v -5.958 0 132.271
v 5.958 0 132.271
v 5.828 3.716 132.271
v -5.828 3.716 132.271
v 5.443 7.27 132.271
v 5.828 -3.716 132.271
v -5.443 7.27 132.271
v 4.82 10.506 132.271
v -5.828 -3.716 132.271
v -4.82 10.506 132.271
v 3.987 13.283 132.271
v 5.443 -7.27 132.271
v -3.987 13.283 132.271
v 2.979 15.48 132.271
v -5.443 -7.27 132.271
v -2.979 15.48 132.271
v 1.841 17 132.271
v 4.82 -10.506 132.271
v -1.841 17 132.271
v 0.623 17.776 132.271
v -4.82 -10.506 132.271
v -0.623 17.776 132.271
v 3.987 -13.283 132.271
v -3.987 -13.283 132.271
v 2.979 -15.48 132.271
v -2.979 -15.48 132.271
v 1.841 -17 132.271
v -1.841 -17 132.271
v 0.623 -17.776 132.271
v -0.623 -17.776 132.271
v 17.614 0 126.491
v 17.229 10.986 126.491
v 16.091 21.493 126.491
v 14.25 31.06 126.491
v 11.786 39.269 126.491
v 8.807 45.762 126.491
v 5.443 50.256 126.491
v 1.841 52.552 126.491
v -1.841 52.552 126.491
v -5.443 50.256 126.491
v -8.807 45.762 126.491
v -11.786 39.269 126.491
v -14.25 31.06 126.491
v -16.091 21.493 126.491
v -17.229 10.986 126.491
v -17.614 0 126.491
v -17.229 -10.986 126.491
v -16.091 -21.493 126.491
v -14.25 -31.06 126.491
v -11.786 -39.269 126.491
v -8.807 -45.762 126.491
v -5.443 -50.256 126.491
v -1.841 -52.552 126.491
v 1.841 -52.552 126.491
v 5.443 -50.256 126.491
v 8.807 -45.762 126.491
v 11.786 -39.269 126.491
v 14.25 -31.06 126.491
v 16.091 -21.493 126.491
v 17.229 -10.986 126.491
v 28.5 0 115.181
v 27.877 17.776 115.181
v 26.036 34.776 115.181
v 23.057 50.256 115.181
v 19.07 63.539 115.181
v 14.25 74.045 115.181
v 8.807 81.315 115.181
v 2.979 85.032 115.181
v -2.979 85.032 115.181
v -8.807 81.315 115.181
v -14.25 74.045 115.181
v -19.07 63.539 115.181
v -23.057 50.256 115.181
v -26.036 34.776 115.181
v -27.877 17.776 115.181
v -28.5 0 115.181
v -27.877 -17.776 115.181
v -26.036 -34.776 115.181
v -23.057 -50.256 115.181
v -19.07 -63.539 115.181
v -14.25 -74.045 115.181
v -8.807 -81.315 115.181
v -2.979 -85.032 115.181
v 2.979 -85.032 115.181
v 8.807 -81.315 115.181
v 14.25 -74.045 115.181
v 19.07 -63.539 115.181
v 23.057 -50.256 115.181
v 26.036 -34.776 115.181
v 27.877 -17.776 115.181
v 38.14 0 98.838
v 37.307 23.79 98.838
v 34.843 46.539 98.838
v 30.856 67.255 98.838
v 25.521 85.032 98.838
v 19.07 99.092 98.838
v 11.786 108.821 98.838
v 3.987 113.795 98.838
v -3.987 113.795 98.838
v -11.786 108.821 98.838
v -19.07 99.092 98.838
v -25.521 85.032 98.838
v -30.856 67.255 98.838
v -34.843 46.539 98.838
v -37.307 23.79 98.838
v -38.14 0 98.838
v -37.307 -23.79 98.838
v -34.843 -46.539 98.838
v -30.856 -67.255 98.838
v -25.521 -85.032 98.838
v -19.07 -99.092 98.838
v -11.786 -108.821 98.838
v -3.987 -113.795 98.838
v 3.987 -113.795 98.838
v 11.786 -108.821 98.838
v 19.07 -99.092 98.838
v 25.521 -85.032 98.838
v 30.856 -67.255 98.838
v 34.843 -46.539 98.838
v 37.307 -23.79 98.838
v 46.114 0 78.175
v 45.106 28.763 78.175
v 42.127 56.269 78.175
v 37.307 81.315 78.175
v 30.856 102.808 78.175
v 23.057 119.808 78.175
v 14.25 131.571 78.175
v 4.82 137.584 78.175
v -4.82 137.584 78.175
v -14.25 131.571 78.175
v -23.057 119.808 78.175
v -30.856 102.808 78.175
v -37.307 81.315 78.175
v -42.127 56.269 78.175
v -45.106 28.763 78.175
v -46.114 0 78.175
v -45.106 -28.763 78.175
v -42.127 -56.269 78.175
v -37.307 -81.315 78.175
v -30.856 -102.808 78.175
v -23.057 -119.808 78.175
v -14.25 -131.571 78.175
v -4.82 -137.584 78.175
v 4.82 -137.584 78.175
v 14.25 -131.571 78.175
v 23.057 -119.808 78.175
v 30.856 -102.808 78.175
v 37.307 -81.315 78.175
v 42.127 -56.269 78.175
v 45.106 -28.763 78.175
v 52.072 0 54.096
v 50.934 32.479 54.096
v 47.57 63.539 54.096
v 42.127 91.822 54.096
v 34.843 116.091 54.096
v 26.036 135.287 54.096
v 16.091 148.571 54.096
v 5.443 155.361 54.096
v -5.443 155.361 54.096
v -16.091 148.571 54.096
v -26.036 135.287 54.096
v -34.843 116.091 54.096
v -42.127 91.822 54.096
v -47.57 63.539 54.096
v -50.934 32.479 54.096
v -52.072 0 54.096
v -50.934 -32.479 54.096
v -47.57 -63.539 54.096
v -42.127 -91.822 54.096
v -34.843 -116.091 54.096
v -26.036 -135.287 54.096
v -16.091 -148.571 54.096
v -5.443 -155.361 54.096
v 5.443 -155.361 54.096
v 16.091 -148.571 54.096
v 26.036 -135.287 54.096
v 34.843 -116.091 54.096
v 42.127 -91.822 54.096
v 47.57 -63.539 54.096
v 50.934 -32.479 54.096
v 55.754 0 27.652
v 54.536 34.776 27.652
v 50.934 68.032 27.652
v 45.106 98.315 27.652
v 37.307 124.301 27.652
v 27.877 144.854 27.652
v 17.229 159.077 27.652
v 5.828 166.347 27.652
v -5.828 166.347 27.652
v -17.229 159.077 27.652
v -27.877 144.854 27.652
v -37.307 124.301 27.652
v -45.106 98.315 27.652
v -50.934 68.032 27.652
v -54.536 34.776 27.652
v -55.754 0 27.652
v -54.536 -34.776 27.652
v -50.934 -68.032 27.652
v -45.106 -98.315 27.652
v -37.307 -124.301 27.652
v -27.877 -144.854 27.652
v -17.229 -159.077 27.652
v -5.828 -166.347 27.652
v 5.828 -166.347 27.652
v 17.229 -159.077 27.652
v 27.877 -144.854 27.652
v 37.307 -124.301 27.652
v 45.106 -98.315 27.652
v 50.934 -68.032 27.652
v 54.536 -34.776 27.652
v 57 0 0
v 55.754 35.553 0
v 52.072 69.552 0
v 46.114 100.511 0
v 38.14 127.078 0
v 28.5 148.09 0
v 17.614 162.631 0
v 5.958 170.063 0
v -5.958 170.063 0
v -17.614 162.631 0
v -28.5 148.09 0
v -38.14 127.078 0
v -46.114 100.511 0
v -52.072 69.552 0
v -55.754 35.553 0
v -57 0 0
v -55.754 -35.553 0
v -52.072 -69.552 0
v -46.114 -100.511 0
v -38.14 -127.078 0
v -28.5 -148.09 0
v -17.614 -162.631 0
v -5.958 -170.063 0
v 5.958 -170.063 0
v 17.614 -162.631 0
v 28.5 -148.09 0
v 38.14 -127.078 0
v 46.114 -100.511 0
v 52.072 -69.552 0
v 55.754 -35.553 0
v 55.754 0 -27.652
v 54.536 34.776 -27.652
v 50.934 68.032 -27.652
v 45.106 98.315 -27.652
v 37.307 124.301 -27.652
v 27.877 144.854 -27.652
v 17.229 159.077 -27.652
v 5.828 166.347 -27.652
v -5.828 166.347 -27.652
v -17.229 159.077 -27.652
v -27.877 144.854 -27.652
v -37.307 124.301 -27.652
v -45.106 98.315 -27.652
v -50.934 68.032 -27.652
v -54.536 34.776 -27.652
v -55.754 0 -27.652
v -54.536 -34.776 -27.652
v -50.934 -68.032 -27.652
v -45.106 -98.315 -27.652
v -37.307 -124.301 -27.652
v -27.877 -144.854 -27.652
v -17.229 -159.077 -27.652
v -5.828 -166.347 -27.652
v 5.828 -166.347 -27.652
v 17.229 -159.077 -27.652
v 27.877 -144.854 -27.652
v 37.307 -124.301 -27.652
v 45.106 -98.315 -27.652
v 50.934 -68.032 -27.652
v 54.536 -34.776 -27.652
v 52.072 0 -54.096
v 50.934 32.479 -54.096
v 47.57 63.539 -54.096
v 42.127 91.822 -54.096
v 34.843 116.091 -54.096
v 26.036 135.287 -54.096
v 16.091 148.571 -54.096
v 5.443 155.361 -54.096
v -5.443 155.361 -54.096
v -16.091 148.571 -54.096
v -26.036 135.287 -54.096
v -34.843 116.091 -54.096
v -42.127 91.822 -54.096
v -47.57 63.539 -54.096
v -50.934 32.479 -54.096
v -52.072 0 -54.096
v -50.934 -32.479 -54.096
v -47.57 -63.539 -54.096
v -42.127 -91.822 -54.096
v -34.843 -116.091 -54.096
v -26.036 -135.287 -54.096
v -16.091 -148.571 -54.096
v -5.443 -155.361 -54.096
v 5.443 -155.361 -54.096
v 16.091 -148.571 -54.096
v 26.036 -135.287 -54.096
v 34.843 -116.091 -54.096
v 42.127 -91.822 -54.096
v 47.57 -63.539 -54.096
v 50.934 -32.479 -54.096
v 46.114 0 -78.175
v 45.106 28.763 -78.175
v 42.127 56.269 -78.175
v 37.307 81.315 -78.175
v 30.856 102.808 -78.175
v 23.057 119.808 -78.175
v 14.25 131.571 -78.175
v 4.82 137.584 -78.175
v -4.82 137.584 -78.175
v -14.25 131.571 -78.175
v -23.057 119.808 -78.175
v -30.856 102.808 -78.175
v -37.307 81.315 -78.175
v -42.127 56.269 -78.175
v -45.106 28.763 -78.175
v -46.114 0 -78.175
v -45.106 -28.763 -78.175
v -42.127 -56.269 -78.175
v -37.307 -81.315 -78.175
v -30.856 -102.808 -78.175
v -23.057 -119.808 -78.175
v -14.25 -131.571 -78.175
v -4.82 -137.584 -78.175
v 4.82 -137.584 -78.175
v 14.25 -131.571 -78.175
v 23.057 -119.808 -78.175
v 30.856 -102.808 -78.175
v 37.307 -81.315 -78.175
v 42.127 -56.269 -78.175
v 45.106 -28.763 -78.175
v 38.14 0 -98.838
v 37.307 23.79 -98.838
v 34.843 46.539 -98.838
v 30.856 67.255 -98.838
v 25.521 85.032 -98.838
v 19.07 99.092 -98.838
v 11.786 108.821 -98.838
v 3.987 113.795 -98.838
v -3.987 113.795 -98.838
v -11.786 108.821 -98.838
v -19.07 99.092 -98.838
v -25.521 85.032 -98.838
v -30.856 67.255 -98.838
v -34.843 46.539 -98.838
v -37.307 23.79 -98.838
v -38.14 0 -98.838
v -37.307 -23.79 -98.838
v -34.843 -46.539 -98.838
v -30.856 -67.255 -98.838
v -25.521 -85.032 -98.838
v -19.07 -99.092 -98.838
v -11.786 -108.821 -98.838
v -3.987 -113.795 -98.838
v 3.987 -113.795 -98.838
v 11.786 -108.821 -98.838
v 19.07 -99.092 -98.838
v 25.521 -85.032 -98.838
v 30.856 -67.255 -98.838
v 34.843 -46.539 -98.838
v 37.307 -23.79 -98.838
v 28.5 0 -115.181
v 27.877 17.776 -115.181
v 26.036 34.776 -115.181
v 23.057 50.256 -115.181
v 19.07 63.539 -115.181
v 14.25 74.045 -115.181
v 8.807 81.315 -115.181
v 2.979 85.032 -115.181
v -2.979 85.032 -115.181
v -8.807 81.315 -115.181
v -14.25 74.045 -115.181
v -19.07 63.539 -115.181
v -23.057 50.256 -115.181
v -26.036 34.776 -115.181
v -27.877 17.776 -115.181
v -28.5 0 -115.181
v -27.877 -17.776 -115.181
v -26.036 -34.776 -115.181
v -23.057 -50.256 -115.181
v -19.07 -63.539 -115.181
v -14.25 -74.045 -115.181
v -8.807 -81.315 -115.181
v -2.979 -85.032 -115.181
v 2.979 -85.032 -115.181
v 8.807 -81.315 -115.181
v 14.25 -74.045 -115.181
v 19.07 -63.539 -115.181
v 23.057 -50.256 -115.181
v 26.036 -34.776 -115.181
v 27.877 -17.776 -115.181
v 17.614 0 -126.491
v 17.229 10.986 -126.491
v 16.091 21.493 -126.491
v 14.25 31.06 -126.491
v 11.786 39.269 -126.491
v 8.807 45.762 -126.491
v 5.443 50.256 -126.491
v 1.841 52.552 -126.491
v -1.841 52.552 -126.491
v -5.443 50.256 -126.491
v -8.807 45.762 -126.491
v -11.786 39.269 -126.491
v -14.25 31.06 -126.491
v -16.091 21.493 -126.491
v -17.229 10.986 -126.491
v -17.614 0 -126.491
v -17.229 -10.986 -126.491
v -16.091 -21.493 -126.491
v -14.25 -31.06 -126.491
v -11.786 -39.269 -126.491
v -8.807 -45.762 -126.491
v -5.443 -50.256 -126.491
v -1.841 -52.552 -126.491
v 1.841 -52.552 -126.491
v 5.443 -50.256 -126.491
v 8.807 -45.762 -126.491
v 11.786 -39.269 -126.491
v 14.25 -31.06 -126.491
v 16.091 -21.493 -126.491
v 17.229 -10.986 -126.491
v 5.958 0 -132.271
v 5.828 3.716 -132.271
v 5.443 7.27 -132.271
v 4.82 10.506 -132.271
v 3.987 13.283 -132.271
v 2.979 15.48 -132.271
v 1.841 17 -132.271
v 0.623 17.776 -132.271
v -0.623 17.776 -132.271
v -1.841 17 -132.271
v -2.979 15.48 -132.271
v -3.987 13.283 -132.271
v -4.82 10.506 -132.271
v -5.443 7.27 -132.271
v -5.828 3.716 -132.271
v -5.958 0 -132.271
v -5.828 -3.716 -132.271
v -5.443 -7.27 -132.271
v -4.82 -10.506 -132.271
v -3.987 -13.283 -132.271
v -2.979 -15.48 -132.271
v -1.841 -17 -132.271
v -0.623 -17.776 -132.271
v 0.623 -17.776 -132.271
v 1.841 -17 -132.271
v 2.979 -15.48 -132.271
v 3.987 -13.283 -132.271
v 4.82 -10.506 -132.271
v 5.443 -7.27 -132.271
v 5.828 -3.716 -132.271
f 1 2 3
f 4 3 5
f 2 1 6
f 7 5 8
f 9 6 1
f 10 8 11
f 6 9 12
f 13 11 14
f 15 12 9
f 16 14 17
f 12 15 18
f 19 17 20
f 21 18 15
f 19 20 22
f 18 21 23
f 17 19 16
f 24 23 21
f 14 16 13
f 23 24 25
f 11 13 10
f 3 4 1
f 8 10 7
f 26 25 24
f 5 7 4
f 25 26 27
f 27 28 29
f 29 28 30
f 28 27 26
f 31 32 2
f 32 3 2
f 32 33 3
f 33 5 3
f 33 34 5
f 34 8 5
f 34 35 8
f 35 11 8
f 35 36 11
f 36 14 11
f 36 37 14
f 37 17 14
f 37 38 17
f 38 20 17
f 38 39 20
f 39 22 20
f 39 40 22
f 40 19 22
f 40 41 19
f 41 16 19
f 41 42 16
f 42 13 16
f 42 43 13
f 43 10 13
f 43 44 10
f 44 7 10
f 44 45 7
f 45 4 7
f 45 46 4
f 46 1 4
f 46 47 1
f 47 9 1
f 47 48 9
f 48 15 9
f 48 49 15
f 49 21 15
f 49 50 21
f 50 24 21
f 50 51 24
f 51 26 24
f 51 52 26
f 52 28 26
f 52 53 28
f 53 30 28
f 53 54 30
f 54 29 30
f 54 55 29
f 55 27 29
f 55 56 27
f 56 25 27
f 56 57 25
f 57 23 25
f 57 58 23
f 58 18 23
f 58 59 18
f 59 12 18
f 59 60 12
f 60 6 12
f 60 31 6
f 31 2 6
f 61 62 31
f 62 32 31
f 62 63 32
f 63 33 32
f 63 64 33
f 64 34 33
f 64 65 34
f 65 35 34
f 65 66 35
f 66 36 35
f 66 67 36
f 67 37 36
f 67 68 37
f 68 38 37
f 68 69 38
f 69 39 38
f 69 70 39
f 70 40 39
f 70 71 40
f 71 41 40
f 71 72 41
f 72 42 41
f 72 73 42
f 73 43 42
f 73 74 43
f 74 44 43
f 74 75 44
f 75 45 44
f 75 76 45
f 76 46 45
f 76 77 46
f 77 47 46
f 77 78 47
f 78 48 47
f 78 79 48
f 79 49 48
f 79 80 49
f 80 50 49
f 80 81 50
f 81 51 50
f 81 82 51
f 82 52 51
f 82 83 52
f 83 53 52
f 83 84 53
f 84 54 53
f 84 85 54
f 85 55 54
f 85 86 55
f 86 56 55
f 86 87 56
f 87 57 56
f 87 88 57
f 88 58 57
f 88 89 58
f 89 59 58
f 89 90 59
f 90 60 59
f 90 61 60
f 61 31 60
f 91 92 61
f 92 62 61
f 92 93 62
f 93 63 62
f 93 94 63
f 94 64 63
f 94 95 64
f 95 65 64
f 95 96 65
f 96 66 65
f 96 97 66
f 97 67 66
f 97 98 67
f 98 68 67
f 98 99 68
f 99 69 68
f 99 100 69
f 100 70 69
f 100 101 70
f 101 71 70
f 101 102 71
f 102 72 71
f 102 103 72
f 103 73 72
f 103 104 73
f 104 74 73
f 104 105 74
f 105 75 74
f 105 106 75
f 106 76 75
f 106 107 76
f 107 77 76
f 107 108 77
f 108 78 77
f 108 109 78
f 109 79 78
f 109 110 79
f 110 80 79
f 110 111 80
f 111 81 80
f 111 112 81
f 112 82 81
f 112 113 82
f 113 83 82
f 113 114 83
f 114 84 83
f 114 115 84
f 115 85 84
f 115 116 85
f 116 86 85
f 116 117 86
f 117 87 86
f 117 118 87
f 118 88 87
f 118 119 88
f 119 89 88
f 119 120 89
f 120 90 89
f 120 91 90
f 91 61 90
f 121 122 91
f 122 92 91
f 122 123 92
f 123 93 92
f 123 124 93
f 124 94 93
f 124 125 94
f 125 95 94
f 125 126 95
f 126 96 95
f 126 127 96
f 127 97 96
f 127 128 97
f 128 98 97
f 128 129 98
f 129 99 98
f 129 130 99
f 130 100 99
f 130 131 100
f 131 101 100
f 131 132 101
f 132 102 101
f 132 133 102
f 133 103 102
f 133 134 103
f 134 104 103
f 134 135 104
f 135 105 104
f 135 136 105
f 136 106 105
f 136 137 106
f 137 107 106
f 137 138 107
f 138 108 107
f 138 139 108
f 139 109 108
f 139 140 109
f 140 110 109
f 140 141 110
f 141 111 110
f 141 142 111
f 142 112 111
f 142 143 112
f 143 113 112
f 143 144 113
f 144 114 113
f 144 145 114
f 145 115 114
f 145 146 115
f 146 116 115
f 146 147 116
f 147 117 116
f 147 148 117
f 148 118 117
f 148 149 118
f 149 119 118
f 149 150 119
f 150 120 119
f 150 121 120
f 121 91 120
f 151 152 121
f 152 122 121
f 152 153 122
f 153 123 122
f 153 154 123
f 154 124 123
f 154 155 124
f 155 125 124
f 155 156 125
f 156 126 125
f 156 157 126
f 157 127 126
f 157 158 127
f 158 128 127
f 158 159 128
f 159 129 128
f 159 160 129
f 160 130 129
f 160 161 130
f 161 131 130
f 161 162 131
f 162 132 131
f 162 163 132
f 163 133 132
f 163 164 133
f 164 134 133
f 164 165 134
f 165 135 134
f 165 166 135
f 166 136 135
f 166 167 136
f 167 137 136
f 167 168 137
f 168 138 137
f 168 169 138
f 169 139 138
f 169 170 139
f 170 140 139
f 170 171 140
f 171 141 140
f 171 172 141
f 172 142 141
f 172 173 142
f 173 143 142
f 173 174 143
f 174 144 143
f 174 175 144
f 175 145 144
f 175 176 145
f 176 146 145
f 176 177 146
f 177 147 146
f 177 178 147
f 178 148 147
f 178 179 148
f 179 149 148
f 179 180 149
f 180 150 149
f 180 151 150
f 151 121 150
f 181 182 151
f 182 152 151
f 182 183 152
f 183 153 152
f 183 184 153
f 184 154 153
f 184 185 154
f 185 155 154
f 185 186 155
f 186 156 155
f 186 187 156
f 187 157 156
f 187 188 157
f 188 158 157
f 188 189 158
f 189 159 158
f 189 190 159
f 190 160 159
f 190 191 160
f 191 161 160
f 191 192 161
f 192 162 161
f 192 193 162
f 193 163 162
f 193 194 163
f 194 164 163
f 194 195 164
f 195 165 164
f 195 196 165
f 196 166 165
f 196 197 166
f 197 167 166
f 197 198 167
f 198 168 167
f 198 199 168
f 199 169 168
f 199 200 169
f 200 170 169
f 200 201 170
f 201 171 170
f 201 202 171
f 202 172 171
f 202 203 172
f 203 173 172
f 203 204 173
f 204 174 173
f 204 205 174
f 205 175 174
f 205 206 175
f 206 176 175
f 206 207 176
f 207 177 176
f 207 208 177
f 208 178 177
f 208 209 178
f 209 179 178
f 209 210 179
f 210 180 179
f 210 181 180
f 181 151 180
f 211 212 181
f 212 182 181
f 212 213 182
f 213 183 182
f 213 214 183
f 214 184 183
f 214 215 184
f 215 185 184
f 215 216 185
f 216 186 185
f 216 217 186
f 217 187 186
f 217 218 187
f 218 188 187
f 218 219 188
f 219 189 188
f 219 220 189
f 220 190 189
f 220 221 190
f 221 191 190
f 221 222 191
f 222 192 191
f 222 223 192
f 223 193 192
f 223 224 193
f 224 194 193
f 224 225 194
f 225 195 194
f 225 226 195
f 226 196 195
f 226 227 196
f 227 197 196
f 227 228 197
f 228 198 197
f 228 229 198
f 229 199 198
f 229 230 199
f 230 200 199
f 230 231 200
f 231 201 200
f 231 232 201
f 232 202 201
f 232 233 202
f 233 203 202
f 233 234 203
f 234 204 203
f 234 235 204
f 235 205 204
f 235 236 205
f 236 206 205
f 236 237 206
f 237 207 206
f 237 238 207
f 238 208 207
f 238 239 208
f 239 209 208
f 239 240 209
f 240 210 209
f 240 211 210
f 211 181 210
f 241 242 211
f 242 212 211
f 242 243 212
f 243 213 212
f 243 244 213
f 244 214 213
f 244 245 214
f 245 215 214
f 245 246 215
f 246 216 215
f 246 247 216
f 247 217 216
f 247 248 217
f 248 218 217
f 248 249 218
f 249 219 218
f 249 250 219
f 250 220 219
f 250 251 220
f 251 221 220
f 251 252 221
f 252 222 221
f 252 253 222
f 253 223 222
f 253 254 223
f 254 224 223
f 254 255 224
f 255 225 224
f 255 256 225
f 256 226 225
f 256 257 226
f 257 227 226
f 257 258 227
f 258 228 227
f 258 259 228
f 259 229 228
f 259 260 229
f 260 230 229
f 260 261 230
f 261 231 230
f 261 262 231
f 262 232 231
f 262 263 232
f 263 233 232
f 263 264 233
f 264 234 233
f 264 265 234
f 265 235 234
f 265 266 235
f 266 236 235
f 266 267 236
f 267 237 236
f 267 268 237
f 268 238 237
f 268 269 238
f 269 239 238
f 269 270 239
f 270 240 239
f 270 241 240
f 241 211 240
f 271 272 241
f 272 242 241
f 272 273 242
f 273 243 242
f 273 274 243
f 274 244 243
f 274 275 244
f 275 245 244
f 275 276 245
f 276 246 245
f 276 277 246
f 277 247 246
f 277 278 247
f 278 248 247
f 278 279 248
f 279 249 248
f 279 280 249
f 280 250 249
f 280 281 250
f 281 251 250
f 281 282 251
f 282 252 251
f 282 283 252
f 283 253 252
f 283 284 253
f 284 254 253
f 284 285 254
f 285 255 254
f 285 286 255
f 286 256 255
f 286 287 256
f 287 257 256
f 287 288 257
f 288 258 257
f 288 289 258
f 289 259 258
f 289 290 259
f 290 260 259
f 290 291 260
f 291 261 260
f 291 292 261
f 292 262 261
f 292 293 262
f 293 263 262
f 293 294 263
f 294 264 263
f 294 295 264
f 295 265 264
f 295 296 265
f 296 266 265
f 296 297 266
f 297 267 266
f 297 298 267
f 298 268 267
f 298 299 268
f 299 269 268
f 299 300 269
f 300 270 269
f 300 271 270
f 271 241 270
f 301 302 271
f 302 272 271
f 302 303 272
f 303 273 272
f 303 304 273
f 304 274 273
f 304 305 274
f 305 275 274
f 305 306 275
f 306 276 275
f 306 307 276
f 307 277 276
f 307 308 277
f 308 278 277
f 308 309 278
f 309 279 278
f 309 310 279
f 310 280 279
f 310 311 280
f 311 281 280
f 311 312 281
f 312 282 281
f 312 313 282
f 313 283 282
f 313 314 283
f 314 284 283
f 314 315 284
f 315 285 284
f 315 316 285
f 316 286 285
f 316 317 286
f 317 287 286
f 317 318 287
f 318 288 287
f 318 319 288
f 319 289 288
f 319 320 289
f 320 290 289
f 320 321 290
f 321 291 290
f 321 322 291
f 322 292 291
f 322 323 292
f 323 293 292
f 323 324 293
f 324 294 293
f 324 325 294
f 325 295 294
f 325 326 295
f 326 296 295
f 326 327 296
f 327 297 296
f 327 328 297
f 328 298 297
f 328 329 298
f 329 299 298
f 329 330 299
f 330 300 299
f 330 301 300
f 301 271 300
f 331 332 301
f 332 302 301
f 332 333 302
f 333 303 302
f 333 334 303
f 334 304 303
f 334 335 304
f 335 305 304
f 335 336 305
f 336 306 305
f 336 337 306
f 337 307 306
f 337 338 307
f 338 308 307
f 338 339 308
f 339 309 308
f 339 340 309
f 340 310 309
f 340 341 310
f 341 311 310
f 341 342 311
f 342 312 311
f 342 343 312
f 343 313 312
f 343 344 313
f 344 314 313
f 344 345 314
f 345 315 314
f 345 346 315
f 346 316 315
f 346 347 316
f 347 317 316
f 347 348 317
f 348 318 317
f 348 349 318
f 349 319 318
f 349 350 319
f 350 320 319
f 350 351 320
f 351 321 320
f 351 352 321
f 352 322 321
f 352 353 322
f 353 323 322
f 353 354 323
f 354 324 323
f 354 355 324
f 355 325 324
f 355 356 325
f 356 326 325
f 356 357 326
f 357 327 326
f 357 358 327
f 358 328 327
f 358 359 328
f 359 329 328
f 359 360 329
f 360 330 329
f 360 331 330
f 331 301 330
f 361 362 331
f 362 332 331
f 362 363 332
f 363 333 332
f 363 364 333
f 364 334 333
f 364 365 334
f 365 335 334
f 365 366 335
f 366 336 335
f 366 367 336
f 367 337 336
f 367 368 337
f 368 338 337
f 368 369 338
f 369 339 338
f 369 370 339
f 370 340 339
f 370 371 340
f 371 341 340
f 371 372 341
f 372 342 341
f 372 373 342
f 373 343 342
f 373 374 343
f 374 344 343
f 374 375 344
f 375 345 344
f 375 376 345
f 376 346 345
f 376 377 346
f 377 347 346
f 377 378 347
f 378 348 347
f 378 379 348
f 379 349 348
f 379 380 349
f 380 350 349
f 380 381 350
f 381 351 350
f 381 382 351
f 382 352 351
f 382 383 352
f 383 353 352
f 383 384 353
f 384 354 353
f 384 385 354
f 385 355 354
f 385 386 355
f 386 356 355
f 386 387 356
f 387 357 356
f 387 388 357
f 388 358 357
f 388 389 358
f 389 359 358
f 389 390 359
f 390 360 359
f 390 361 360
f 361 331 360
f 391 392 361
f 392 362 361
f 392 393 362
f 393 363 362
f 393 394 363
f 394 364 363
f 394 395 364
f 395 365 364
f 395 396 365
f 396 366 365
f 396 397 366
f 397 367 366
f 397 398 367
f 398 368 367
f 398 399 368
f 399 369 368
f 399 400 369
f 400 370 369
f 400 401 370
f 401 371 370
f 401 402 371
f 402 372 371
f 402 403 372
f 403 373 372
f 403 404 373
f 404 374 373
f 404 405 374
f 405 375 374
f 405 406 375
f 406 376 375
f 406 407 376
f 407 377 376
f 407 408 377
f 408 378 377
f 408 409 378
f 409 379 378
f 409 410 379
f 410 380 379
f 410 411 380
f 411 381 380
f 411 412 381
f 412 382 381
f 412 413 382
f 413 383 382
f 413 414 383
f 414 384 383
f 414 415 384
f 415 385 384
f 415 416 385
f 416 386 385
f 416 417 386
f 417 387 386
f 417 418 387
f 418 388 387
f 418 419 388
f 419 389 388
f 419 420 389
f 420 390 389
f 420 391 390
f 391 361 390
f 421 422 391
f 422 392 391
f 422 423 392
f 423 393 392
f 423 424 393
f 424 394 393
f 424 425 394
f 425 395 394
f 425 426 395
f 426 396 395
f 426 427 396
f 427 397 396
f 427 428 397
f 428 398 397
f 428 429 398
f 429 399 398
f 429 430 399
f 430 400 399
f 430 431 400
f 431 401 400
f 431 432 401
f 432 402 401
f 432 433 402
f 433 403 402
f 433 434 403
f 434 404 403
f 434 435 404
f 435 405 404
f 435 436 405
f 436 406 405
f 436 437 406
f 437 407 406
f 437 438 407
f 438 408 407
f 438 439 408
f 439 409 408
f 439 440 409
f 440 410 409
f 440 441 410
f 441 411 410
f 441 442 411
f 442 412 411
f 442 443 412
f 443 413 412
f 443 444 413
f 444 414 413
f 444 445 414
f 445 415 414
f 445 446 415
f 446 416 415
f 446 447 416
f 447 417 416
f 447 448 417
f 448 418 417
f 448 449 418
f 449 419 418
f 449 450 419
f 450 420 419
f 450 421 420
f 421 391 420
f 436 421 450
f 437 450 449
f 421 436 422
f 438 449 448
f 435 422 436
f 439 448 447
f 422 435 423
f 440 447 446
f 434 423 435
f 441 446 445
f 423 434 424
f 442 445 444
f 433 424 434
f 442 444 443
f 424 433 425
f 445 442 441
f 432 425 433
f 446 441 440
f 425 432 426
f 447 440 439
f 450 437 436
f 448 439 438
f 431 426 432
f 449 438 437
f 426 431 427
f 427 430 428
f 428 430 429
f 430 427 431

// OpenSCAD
// Generated by SolidPython 1.0.1 on 2020-07-29 00:46:45


scale(v = [3, 9, 7]) {
	sphere(r = 19);
}
/***********************************************
*********      SolidPython code:      **********
************************************************
 
# import packages: SolidPython
from solid import *
from solid.utils import *
from itertools import chain, combinations, permutations


class Resize:

    def __init__(self, scad_file):
        self.scad_file = scad_file
        #self.scad_file = import_scad(scad_file)
        # cone/cylinder param:
        self.r1 = 0
        self.r2 = 0
        self.h = 0
        # rectangular prism param:
        self.w = 0
        self.l = 0
        # ellipse param:
        self.r = 0

    # import OpenScad code (file name corresponds to shape)


    # classify shape + parameters
    def assign(self, param1, param2, param3):
        if self.scad_file == 'cone.scad':
            self.r1 = param1
            self.r2 = param2
            self.h = param3
        elif self.scad_file == 'cylinder.scad':
            self.r1 = param1
            self.r2 = param2
            self.h = param3
        elif self.scad_file == 'rectangularPrism.scad':
            self.h = param1
            self.l = param2
            self.w = param3
        else:
            self.r = param1
            self.h = param2

    # resize parameters
    def iterate(self):
        x = range(3, 20, 2)
        i = 1
        if self.scad_file == 'cone.scad':
            tempList = list(permutations(x, 2))
            for temp in tempList:
                param1 = temp[0]
                param2 = temp[1]
                filepath = 'produced_scad_files/' + 'cone' + str(param1) + '_' + str(param2) + '_' + '.scad'
                scad_render_to_file(cylinder(h=param1, r1=param2, r2=0), filepath)

        elif self.scad_file == 'cylinder.scad':
            tempList = list(permutations(x, 3))
            for temp in tempList:
                param1 = temp[0]
                param2 = temp[1]
                filepath = 'produced_scad_files/' + 'cylinder' + str(param1) + '_' + str(param2) + '_' + '.scad'
                scad_render_to_file(cylinder(h=param1, r1=param2, r2=param2), filepath)

        elif self.scad_file == 'rectangularPrism.scad':
            tempList = list(permutations(x, 3))
            for temp in tempList:
                param1 = temp[0]
                param2 = temp[1]
                param3 = temp[2]
                filepath = 'produced_scad_files/' + 'rectangularPrism' + str(param1) + '_' + str(param2) + '_' + str(
                    param3) + '.scad'
                scad_render_to_file(cube(size=(param1, param2, param3)), filepath)

        elif self.scad_file == 'ellipse.scad':
            tempList = list(permutations(x, 4))
            for temp in tempList:
                param1 = temp[0]
                param2 = temp[1]
                param3 = temp[2]
                param4 = temp[3]
                filepath = 'produced_scad_files/' + 'ellipse' + str(param1) + '_' + str(param2) + '_' + str(param3) + '_' + str(param4) + '.scad'
                scad_render_to_file(scale([param1, param2, param3])(sphere(r=param4)), filepath)

    def render_to_scadfile(self):
        scad_render_to_file(scad, 'example.scad') 
 
************************************************/
